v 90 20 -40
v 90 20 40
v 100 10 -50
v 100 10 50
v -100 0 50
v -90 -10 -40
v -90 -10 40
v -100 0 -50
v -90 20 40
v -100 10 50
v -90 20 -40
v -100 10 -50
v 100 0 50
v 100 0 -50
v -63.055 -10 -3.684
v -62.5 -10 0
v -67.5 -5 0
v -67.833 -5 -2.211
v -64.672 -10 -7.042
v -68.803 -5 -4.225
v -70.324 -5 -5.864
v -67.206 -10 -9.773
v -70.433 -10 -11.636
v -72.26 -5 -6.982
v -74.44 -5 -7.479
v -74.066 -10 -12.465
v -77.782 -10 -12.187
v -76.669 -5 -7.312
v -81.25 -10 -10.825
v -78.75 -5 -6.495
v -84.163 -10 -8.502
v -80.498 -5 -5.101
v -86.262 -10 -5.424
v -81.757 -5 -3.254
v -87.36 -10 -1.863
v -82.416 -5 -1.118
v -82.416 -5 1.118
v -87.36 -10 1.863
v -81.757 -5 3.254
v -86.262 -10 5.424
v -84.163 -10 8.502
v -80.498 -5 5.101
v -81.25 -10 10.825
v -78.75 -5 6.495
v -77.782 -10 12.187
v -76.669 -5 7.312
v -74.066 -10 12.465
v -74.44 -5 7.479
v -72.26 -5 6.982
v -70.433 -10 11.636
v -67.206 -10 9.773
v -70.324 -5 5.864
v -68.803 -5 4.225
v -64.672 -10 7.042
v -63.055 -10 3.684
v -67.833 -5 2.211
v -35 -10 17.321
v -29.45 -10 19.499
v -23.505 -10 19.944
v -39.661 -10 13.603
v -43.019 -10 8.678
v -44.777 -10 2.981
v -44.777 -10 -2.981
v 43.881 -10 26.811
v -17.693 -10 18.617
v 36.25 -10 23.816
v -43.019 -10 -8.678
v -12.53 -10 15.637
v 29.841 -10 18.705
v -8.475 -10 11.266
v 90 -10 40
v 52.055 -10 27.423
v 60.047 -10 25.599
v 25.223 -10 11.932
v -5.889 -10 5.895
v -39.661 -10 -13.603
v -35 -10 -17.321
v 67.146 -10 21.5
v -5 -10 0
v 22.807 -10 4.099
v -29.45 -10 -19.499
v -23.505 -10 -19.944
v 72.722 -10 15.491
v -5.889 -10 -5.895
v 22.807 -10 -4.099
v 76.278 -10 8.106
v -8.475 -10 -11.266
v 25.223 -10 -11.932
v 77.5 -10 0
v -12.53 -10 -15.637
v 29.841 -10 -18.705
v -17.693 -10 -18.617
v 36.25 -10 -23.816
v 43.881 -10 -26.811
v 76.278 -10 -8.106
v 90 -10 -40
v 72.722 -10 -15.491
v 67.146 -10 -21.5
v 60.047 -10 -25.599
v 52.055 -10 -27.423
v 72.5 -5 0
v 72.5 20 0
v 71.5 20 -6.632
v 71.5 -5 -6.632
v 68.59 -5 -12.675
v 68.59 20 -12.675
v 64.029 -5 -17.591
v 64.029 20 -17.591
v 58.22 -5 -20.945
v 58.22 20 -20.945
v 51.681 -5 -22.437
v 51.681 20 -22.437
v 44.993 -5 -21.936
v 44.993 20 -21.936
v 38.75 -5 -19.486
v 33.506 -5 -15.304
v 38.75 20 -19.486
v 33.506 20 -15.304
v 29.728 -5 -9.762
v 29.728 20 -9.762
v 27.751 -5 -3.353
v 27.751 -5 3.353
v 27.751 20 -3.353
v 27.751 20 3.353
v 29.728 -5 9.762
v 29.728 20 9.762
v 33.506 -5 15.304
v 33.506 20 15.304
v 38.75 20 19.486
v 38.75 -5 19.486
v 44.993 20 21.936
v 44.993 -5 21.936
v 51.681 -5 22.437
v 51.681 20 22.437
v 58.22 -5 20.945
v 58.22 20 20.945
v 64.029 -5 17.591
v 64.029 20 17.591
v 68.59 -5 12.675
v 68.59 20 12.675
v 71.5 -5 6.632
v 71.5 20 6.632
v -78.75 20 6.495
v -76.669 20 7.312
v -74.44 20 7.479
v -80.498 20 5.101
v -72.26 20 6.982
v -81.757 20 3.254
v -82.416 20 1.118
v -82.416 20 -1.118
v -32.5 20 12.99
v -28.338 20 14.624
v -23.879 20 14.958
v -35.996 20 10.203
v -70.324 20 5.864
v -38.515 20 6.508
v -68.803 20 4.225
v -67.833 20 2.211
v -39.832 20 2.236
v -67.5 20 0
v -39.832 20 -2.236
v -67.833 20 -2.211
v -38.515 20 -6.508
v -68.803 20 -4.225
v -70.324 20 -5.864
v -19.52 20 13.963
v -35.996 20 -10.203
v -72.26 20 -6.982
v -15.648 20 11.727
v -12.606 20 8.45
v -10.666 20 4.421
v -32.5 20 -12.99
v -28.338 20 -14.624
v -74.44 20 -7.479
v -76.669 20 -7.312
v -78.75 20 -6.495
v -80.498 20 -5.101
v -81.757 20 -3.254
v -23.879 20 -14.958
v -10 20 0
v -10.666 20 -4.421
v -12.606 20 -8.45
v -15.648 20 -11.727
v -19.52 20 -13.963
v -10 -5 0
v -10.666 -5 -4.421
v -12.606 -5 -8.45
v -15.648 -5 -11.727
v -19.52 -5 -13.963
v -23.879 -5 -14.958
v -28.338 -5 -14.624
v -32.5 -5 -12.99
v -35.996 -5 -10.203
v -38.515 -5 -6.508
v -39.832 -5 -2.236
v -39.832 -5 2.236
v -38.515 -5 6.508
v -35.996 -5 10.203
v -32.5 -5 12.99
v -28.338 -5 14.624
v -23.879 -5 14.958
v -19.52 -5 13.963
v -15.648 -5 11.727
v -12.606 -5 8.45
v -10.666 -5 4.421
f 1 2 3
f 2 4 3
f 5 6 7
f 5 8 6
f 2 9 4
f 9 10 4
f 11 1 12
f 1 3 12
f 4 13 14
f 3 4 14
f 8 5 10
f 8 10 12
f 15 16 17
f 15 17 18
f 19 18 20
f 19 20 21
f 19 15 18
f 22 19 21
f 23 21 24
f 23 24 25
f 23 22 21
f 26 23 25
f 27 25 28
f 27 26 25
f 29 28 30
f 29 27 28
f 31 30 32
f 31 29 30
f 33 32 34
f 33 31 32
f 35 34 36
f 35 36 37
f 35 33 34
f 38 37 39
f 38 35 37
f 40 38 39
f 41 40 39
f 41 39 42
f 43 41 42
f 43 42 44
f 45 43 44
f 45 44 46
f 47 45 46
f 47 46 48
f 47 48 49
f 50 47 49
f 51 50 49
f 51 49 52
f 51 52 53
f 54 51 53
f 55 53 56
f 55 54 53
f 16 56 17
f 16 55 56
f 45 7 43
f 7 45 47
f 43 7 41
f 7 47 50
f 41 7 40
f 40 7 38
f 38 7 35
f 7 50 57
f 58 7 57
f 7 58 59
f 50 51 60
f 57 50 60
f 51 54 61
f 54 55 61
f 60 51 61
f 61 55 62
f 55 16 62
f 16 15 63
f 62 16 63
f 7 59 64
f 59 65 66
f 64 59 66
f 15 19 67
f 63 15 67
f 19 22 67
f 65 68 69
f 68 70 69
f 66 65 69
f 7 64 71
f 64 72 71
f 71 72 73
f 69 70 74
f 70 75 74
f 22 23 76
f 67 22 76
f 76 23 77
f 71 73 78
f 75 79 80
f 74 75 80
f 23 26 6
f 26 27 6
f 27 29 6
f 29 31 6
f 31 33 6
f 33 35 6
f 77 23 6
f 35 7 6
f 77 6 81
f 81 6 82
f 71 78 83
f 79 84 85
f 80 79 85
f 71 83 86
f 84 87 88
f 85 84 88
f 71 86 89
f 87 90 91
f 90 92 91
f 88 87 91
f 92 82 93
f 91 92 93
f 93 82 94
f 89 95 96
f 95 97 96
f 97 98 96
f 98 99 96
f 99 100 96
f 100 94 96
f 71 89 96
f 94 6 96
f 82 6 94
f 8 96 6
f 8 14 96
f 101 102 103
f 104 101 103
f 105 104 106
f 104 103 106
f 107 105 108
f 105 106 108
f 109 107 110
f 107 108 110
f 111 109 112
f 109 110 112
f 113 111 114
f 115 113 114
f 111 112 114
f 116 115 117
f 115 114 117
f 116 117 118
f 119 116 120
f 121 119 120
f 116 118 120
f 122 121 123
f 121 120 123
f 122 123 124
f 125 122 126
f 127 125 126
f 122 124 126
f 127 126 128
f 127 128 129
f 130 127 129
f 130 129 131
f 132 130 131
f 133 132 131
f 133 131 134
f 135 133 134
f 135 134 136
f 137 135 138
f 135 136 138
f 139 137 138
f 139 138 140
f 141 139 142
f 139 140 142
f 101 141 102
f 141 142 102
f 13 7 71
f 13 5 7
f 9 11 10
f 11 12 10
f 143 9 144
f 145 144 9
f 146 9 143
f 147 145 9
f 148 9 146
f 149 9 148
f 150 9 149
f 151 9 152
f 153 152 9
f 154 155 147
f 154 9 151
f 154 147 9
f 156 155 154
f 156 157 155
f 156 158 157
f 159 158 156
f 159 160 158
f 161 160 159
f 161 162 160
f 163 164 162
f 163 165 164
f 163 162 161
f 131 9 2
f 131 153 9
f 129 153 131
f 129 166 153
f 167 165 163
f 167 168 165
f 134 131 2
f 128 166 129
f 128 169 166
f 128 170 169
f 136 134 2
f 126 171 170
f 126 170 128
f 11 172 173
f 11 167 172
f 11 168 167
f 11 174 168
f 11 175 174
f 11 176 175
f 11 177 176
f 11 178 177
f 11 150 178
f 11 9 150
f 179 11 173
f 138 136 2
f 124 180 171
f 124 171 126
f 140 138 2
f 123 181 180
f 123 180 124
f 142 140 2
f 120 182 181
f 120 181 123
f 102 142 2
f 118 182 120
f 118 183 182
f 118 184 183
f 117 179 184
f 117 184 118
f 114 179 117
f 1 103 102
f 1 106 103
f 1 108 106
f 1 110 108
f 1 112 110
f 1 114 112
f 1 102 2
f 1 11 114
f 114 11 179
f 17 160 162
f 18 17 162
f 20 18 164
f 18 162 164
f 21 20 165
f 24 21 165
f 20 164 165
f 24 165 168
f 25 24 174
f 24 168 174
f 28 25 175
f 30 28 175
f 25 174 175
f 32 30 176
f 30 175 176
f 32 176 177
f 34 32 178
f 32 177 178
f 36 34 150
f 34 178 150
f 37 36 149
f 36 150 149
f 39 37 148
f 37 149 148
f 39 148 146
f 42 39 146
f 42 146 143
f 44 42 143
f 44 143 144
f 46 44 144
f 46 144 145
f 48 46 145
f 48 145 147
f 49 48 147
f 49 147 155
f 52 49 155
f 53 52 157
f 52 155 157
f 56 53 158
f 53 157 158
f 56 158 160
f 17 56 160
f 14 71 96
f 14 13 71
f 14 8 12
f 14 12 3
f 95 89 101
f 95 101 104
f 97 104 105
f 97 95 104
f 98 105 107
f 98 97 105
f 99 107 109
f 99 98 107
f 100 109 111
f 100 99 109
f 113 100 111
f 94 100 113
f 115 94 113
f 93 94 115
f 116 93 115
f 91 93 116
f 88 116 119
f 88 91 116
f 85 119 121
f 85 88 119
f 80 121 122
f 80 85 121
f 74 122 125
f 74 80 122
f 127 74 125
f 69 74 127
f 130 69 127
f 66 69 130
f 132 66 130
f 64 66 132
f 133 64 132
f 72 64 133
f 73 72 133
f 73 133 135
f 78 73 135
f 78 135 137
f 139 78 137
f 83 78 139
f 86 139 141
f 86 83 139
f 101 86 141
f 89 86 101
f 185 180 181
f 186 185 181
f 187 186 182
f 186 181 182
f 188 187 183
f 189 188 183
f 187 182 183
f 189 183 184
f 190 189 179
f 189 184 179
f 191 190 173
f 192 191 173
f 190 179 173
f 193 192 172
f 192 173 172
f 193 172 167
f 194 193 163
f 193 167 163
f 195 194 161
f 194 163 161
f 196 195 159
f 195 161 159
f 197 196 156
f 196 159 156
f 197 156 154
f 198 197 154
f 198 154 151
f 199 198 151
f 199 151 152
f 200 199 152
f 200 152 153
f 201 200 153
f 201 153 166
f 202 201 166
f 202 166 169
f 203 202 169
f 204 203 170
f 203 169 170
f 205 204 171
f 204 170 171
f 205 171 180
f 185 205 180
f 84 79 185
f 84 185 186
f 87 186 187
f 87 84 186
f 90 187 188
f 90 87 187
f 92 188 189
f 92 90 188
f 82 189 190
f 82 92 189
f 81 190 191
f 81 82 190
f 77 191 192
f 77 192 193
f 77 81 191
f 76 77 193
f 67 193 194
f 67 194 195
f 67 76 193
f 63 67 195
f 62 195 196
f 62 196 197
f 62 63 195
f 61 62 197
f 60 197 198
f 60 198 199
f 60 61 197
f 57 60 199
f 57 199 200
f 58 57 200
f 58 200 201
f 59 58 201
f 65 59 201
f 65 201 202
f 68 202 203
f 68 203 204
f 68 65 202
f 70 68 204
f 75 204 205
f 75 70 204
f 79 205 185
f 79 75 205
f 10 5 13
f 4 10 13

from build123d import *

# Parameters (mm, degrees)
CROQUIS1_W              = 200
CROQUIS1_H              = 100
SALIENTE_EXTRUIR1_DEPTH = 10
CROQUIS2_W              = 180
CROQUIS2_H              = 80
CROQUIS3_W              = 180
CROQUIS3_H              = 80
CROQUIS4_R              = 7.5
CROQUIS4_R_2            = 15
CROQUIS4_R_3            = 22.5
CORTAR_EXTRUIR1_DEPTH   = 30
CHAFL_N2_SIZE           = 5


with BuildPart() as part:
    # Croquis1 → Saliente-Extruir1 (new body)
    with BuildSketch(Plane(origin=(0, 0, 0), x_dir=(1, 0, 0), z_dir=(0, 1, 0))):
        Rectangle(CROQUIS1_W, CROQUIS1_H)
    extrude(amount=SALIENTE_EXTRUIR1_DEPTH)

    # Croquis2 → section 0 of recubrir1
    with BuildSketch(Plane(origin=(0, -10, 0), x_dir=(1, 0, 0), z_dir=(0, 1, 0)), mode=Mode.PRIVATE) as recubrir1_s0:
        Rectangle(CROQUIS2_W, CROQUIS2_H)
    # loft up to a face of the part (recubrir1)
    loft([recubrir1_s0.sketch, part.faces().sort_by_distance((0, 0, 0))[0]])

    # Croquis3 → section 0 of recubrir2
    with BuildSketch(Plane(origin=(0, 20, 0), x_dir=(1, 0, 0), z_dir=(0, 1, 0)), mode=Mode.PRIVATE) as recubrir2_s0:
        Rectangle(CROQUIS3_W, CROQUIS3_H)
    # loft up to a face of the part (recubrir2)
    loft([recubrir2_s0.sketch, part.faces().sort_by_distance((0, 10, 0))[0]])

    # Croquis4 → Cortar-Extruir1 (cut)
    with BuildSketch(Plane(origin=(0, 20, 0), x_dir=(1, 0, 0), z_dir=(0, 1, 0))):
        with Locations((-75, 0)):
            Circle(CROQUIS4_R)
        with Locations((-25, 0)):
            Circle(CROQUIS4_R_2)
        with Locations((50, 0)):
            Circle(CROQUIS4_R_3)
    extrude(amount=-CORTAR_EXTRUIR1_DEPTH, mode=Mode.SUBTRACT)

    # Chaflán2
    chafl_n2_edges = [part.edges().sort_by_distance(p)[0] for p in [
        (-82.5, -10, 0),
        (-40, -10, 0),
        (27.5, -10, 0),
    ]]
    chamfer(chafl_n2_edges, length=CHAFL_N2_SIZE)


solid = part.part
